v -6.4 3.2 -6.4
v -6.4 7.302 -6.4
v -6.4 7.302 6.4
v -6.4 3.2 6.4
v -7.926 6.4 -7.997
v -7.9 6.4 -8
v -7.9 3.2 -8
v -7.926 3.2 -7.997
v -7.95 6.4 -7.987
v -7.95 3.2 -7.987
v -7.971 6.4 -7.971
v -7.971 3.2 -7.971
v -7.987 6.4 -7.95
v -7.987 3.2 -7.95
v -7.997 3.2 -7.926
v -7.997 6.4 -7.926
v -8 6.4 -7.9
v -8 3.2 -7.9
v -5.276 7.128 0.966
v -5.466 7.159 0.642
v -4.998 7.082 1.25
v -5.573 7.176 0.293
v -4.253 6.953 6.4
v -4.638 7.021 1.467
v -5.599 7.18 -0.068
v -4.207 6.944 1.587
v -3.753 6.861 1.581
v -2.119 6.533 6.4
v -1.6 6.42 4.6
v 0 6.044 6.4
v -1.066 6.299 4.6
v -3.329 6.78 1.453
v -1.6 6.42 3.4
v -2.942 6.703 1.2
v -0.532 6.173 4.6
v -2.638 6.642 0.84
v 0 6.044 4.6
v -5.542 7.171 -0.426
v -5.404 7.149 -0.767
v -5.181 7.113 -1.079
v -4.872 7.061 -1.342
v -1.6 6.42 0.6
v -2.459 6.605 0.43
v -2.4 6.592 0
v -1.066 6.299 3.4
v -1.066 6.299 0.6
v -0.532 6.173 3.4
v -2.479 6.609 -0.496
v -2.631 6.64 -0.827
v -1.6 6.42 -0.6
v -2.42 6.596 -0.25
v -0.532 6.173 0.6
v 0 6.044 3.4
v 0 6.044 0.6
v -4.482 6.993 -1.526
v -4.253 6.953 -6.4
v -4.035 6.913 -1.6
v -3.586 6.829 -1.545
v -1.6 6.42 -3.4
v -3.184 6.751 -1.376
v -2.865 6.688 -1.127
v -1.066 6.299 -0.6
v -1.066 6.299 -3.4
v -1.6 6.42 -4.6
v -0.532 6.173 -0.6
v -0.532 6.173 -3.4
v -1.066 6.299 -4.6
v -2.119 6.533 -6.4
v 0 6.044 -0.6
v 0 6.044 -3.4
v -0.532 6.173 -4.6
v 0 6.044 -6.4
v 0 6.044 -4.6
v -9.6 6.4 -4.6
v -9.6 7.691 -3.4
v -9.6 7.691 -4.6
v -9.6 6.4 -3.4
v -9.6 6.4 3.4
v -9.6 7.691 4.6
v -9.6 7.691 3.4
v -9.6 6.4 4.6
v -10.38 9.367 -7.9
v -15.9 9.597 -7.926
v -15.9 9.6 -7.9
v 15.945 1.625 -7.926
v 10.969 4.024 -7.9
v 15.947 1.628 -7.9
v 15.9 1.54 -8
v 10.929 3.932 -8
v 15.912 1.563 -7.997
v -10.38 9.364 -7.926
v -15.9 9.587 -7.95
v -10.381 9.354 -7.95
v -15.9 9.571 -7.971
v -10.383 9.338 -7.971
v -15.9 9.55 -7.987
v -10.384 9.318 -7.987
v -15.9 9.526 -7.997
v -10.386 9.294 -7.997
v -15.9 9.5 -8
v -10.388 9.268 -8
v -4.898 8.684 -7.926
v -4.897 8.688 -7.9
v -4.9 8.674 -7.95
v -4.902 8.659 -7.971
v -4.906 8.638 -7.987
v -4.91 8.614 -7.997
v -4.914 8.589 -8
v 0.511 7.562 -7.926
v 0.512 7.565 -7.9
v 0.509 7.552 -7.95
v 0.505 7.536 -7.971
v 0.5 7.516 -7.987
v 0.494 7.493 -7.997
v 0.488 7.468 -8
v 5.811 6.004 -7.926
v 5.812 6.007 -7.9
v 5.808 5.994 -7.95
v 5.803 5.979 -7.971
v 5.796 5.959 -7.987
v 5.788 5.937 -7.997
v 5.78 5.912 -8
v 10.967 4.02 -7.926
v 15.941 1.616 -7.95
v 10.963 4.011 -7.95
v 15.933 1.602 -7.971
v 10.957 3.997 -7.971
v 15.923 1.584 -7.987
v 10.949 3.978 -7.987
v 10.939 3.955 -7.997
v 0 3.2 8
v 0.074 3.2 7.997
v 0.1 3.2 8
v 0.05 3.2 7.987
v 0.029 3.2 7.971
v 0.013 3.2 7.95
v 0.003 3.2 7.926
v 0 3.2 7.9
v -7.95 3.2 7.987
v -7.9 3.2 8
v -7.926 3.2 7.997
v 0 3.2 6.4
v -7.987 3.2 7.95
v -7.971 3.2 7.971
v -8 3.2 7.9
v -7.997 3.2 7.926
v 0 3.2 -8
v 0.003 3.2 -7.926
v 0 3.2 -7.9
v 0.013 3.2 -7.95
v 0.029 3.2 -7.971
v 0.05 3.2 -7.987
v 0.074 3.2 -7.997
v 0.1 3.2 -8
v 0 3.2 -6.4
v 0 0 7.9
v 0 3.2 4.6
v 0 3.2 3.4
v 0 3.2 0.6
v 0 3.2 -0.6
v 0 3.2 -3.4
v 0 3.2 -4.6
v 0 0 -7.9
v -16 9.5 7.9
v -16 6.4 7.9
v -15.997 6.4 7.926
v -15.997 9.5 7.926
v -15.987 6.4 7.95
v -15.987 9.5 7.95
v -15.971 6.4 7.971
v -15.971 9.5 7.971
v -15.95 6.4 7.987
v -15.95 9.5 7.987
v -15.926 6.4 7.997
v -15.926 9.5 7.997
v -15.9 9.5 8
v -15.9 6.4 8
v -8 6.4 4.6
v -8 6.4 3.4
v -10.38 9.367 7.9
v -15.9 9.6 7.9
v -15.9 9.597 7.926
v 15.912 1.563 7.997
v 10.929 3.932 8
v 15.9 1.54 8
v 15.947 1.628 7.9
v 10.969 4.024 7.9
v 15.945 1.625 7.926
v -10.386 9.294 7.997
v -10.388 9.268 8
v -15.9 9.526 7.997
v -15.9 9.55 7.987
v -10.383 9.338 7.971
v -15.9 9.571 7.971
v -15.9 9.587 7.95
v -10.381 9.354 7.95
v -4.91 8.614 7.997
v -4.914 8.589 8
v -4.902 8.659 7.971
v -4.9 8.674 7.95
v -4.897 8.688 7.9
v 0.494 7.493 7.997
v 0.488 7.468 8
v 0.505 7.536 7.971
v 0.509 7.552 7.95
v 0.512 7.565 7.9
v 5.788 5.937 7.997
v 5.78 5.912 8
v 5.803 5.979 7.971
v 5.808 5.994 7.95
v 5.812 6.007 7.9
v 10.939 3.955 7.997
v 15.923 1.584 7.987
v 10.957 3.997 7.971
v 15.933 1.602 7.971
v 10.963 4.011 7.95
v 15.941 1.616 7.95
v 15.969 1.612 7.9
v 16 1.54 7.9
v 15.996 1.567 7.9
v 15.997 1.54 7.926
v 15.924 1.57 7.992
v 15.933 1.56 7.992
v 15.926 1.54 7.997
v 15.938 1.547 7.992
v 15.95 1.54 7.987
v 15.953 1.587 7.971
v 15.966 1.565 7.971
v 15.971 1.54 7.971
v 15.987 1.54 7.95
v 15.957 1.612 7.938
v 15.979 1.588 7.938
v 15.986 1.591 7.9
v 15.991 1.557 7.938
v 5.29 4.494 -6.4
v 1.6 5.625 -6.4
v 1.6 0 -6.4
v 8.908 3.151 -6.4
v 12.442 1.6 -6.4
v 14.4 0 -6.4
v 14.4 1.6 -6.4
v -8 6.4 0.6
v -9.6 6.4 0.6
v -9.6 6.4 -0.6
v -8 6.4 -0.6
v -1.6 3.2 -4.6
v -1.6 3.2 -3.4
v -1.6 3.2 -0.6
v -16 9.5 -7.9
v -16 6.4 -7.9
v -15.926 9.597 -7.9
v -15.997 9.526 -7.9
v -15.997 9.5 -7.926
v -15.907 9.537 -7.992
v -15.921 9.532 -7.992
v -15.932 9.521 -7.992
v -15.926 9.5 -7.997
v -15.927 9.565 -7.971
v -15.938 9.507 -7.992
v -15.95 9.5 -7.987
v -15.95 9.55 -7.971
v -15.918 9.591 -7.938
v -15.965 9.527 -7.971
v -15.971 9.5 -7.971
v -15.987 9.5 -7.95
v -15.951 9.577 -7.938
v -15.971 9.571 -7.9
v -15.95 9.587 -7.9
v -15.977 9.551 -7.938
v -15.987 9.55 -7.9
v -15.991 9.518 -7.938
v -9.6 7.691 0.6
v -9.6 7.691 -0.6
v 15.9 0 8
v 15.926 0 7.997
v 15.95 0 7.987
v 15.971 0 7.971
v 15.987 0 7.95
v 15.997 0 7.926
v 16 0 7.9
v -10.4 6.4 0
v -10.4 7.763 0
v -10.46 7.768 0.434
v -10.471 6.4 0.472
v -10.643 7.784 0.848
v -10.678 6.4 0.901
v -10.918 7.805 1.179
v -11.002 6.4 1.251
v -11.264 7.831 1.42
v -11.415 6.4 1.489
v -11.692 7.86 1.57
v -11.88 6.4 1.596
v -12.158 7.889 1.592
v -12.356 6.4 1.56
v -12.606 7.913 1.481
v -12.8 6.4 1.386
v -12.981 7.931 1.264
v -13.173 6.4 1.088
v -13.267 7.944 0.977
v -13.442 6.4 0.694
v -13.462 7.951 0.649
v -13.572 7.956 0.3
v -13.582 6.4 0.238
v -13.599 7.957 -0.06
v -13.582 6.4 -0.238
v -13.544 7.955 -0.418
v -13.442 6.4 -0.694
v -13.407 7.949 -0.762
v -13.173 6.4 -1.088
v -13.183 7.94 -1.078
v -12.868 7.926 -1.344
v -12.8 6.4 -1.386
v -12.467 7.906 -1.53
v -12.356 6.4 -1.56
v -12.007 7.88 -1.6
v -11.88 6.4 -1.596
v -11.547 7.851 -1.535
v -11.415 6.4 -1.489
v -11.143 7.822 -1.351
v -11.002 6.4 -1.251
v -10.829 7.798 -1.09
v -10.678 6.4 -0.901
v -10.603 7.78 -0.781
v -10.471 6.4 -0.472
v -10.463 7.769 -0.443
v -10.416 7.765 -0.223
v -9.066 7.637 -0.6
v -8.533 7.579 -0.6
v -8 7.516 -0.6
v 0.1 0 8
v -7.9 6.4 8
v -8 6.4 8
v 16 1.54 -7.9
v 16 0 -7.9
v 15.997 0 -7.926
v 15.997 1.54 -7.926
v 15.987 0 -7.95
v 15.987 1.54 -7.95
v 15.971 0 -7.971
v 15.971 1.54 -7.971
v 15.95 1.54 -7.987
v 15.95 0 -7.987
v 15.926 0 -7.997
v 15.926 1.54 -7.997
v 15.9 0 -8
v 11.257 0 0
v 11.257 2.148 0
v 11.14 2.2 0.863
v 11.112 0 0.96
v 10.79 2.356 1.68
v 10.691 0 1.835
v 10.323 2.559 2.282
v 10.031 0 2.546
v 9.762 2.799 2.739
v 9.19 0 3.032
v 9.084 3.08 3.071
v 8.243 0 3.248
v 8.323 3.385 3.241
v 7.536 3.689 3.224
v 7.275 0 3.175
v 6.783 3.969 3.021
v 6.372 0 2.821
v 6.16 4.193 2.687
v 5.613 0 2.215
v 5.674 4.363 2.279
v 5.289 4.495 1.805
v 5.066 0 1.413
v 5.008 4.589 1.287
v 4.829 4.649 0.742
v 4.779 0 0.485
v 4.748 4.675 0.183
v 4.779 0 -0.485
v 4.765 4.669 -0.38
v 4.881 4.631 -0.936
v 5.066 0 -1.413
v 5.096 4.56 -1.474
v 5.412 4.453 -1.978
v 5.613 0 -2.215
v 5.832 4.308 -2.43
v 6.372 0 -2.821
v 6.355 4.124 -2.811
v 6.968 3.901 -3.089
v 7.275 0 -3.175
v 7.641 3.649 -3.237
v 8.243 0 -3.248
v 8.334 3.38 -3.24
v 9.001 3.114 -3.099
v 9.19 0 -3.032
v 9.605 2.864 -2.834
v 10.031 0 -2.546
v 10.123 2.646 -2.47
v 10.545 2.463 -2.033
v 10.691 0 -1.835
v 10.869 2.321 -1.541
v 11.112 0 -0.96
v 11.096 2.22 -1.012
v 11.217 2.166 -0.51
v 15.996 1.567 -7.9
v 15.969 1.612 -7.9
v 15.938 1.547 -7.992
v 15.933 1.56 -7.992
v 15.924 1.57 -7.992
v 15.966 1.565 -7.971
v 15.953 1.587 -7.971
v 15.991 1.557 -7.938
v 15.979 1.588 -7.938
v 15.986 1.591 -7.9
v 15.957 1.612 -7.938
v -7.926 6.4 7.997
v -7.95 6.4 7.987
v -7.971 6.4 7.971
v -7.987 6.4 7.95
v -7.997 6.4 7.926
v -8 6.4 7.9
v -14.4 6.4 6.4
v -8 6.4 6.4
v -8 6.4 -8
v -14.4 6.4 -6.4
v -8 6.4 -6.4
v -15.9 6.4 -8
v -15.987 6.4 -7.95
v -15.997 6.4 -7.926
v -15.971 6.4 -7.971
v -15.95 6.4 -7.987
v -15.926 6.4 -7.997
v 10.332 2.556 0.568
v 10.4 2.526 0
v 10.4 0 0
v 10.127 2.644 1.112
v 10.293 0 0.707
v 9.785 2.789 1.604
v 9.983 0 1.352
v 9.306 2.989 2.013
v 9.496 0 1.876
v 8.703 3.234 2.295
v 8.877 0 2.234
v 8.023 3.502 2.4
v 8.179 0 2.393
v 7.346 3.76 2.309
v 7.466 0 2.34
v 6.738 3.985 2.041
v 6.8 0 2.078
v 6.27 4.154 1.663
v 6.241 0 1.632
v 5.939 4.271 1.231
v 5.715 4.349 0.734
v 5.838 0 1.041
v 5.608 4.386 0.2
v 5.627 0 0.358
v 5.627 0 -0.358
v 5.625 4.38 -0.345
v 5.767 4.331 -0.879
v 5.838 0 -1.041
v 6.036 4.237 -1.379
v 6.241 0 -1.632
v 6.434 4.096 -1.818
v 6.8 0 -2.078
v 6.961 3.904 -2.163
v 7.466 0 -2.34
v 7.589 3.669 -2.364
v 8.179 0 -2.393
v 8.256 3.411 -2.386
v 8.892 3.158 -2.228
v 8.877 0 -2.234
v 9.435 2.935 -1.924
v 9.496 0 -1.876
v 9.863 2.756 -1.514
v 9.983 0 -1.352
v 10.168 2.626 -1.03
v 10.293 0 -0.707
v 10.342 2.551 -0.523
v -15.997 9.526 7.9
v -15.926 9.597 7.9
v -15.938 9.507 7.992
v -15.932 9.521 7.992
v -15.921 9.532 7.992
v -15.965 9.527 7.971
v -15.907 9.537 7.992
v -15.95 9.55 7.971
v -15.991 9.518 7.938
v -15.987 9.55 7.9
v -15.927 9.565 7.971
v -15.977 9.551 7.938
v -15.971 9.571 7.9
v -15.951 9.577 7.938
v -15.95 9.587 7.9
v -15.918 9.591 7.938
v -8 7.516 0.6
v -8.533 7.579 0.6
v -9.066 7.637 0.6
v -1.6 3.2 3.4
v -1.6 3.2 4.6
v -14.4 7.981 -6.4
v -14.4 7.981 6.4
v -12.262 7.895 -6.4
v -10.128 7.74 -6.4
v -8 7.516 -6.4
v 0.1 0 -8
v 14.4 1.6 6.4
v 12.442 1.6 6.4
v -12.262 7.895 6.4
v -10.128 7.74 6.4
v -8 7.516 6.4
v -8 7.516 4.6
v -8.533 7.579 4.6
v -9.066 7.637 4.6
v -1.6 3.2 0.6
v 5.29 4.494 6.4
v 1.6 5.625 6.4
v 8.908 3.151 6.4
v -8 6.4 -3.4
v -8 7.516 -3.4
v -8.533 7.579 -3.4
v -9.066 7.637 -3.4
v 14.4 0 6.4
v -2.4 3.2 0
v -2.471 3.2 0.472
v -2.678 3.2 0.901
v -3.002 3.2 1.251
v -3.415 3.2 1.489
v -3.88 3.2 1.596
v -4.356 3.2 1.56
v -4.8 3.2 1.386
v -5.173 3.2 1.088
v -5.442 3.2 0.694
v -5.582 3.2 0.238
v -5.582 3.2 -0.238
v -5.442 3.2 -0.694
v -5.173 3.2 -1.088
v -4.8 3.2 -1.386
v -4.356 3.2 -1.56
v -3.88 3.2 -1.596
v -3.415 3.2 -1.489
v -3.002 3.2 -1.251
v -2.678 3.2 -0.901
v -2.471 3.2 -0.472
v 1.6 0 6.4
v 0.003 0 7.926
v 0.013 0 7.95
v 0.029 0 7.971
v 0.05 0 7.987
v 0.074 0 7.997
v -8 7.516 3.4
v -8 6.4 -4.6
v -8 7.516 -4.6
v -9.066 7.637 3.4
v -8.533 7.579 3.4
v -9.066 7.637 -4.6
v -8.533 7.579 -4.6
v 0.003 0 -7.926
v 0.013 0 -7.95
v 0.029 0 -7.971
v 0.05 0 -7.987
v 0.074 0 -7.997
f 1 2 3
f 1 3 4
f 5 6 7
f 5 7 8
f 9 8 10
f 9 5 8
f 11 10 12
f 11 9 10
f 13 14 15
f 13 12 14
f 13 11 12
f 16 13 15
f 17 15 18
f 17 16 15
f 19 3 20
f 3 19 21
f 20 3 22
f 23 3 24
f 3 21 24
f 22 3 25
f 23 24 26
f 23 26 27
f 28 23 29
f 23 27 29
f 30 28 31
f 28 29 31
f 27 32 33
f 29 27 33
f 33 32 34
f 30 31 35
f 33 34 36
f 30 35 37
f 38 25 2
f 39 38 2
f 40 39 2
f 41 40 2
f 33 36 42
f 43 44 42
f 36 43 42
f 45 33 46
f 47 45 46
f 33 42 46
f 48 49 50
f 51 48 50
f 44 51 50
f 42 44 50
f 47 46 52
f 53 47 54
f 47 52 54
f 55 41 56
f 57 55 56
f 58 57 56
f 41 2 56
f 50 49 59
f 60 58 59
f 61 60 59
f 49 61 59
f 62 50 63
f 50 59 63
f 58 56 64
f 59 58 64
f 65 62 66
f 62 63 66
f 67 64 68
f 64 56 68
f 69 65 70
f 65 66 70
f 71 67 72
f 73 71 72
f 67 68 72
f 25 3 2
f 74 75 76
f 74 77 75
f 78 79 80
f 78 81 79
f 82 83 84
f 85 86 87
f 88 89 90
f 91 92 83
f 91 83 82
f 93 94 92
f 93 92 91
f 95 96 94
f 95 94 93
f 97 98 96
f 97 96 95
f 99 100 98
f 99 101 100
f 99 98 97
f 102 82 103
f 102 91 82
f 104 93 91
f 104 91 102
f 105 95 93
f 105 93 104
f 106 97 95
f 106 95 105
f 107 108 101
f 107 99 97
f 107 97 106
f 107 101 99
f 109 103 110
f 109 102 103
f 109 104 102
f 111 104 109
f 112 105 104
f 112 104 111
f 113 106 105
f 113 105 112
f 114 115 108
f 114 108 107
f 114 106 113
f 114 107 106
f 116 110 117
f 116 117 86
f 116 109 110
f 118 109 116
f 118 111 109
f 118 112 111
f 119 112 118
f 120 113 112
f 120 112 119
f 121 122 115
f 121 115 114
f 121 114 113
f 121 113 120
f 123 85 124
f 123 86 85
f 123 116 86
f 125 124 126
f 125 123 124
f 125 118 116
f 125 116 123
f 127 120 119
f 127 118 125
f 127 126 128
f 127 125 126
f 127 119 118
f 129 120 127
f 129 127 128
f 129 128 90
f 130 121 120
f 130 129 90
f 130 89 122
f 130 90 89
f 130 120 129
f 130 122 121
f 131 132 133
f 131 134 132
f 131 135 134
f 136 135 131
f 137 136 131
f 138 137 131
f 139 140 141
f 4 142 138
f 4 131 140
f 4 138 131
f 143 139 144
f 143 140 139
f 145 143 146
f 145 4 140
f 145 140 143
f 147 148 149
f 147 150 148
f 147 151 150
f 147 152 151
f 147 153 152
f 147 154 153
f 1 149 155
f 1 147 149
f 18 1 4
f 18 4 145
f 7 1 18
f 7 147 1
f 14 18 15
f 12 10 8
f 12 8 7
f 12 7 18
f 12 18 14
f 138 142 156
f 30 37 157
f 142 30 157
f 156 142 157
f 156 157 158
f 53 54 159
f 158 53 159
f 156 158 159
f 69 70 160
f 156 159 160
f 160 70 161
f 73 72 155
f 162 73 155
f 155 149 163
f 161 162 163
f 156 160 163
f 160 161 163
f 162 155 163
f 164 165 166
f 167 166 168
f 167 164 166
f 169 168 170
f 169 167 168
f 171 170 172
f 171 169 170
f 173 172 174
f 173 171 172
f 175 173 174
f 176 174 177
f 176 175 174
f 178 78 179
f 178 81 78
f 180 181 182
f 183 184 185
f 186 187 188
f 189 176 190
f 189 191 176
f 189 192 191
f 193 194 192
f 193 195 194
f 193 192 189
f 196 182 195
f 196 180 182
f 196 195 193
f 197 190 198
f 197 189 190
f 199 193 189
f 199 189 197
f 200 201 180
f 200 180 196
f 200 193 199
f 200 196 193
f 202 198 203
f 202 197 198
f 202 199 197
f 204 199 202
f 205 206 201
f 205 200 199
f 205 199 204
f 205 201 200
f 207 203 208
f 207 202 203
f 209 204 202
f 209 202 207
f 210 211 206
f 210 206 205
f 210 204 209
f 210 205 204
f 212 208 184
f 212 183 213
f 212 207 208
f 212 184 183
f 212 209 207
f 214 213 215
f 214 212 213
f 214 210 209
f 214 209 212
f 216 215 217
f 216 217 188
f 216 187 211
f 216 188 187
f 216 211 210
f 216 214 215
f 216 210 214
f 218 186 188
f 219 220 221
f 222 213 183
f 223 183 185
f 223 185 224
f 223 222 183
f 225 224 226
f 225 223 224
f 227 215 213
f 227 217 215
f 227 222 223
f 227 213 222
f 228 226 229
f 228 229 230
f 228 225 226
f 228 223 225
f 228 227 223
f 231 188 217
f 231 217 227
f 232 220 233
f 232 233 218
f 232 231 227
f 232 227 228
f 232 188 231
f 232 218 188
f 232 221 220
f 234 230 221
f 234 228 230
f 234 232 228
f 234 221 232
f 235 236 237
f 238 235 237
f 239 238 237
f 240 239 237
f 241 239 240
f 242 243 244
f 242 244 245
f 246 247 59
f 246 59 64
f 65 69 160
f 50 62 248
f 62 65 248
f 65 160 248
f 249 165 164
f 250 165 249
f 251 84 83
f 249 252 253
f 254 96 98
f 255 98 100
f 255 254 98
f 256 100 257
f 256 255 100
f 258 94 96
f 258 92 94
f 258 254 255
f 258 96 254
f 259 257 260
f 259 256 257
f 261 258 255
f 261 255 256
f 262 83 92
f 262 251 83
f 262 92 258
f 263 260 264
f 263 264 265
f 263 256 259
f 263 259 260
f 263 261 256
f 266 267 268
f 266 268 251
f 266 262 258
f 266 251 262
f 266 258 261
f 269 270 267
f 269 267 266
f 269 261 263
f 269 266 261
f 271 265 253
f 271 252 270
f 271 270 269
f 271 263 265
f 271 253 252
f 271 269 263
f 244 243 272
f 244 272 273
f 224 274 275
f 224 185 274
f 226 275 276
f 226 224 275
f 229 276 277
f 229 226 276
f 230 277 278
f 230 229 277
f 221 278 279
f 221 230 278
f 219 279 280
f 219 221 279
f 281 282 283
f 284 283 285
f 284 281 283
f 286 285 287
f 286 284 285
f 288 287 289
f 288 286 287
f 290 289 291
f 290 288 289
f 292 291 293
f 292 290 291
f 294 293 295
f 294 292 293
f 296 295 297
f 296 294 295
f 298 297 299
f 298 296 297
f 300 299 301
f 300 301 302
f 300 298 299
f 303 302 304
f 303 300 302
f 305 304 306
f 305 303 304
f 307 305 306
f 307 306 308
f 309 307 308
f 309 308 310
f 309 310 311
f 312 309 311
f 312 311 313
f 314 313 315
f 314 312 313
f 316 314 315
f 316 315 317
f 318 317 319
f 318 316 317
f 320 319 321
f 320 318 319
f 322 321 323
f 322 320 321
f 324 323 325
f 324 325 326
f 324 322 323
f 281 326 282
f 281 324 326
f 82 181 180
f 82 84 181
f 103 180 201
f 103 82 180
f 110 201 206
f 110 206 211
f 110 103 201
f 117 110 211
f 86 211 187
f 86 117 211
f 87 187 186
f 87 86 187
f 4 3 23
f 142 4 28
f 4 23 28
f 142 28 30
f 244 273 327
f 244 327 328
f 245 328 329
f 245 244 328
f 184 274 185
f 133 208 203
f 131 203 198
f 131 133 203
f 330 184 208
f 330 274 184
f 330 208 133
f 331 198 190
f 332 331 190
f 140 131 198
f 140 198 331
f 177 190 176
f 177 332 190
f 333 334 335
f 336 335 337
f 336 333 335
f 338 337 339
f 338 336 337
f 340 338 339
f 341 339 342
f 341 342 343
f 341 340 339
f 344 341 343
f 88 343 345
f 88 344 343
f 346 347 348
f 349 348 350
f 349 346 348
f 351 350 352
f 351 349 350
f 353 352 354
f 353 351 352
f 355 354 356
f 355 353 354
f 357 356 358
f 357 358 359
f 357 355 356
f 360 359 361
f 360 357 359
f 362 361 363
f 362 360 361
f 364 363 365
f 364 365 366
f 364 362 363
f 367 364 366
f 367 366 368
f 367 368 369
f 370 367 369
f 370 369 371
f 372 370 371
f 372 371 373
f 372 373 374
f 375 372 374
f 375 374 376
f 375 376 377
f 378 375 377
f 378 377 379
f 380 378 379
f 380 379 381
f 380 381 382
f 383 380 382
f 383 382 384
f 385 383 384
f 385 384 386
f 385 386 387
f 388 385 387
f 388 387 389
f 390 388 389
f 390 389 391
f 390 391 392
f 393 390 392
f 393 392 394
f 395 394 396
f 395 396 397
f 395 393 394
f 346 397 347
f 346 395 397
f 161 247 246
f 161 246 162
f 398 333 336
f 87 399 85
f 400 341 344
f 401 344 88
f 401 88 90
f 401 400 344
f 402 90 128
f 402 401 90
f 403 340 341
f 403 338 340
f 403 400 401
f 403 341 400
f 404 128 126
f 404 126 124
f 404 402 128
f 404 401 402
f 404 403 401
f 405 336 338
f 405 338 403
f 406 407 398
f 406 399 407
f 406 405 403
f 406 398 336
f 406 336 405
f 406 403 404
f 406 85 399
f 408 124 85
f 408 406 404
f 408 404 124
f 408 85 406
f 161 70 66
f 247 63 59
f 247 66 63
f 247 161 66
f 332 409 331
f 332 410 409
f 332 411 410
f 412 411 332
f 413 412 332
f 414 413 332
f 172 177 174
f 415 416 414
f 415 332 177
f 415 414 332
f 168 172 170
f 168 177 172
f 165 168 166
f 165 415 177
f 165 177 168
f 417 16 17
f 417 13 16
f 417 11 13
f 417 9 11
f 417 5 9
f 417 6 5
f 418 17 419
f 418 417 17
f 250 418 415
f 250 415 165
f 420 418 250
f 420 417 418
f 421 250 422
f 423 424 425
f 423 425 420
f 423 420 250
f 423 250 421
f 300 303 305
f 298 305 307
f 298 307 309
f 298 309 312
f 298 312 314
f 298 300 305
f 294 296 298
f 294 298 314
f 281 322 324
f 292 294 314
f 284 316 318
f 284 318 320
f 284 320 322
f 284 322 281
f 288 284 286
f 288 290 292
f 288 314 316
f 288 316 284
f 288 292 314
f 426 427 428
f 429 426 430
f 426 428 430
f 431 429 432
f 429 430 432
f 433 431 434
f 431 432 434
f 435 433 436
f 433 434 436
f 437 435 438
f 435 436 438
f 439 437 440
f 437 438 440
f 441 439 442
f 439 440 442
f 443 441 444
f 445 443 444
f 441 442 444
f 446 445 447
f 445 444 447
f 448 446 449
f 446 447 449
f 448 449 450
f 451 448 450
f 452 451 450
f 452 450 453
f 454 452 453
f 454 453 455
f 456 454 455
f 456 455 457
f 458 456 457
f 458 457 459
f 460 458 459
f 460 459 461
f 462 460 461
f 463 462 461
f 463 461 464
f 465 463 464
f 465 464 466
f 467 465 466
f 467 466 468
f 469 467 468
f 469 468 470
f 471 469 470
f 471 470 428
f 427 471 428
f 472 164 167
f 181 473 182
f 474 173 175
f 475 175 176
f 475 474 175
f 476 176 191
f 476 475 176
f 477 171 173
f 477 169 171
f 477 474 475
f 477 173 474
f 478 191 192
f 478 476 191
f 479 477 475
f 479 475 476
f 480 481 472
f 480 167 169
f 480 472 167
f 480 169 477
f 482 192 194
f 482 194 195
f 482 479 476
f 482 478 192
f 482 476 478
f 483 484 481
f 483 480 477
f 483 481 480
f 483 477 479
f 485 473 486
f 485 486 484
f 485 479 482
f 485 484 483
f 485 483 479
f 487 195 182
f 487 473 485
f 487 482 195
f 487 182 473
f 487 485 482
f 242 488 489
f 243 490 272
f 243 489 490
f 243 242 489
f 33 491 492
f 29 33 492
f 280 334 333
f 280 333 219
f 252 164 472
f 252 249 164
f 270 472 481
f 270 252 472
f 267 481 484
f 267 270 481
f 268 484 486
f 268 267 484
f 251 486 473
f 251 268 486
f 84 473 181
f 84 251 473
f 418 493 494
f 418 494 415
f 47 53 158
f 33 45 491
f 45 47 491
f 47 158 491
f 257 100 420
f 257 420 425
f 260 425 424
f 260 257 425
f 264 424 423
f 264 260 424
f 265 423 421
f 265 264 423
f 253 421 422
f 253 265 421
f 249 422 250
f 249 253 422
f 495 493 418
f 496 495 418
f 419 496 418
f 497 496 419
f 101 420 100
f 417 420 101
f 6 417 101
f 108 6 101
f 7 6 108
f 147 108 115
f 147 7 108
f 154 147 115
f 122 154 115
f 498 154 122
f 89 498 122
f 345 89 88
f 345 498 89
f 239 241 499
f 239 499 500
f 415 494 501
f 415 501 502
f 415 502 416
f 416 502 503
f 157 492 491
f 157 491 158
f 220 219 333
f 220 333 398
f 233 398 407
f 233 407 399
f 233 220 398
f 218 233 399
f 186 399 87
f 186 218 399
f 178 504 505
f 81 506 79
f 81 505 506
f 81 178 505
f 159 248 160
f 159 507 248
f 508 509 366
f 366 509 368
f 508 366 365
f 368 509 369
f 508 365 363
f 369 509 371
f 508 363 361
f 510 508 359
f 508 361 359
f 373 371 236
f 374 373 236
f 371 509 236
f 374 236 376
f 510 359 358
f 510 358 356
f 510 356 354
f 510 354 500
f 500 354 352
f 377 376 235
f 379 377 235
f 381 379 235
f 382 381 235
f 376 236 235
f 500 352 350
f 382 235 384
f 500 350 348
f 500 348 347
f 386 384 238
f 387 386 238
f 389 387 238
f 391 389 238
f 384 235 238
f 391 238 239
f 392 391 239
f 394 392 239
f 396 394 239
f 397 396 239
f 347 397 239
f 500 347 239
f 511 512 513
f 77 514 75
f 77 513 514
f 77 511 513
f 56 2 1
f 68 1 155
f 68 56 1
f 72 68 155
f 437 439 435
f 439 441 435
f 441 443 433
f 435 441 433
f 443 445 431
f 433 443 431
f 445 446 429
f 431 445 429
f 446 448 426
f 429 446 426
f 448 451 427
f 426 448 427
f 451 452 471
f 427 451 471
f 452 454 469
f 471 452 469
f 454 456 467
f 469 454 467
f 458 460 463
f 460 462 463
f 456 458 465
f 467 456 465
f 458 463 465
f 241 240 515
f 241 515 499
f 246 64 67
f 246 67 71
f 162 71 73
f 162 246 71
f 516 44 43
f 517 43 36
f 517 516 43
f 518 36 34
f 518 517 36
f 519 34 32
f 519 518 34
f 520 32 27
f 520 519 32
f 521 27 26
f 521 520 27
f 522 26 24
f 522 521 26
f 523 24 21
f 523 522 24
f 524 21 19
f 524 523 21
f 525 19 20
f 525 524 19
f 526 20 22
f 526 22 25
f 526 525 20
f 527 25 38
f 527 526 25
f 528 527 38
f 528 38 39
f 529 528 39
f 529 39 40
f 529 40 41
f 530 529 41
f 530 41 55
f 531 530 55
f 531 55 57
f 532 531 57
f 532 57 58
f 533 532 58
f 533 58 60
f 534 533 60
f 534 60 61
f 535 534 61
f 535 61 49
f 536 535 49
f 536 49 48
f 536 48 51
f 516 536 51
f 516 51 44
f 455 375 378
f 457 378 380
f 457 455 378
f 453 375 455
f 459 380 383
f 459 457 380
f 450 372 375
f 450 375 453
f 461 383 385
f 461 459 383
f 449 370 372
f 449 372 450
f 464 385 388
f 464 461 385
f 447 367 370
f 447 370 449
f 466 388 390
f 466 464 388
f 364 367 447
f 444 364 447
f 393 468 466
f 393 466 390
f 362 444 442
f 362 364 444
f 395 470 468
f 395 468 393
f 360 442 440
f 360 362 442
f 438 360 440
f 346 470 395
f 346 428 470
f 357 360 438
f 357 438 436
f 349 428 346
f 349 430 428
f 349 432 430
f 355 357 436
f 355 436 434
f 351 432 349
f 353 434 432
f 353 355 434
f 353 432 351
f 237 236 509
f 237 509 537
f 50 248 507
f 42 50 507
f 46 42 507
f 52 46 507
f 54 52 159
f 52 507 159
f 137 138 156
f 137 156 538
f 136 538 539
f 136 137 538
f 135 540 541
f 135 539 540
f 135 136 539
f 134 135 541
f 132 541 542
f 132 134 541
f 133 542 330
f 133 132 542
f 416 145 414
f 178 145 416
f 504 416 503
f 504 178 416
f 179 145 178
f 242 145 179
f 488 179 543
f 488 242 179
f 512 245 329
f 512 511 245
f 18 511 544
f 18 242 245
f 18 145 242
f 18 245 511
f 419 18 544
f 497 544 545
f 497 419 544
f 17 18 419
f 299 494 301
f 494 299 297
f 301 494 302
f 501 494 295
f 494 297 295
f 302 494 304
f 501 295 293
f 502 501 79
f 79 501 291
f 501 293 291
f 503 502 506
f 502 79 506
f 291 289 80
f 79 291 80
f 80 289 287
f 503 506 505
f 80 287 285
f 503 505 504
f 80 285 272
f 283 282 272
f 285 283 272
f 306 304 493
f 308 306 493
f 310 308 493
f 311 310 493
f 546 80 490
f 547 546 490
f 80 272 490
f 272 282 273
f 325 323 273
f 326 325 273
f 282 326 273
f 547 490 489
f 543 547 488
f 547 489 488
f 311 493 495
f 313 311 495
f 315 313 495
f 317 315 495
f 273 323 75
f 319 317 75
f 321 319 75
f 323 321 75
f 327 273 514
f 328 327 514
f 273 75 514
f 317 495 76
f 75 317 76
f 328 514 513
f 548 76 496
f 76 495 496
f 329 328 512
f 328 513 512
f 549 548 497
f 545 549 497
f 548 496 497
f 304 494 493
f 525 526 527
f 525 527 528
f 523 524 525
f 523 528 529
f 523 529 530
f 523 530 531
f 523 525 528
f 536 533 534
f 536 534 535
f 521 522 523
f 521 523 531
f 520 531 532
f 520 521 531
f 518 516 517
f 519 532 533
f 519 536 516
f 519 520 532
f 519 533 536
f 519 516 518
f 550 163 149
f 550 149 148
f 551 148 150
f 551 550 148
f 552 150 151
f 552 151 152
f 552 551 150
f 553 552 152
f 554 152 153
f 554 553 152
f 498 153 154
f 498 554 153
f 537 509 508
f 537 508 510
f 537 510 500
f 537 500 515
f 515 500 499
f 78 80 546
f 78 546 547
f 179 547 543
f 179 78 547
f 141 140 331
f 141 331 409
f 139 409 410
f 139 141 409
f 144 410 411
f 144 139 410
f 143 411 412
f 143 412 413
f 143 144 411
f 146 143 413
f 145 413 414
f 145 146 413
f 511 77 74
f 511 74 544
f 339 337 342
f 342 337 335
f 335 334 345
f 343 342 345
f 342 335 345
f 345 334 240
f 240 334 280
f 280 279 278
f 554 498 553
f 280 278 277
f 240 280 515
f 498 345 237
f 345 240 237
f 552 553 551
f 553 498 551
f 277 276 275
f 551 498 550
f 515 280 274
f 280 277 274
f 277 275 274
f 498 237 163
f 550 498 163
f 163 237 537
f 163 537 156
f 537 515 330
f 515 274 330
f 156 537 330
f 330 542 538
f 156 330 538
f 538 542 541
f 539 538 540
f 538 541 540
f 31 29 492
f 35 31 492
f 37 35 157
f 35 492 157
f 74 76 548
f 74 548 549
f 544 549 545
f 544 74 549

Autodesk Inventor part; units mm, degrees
ref_plane "YZ Plane" through (0, 0, 0) normal (1, 0, 0) x (0, 1, 0)
ref_plane "XZ Plane" through (0, 0, 0) normal (0, 1, 0) x (-1, 0, 0)
ref_plane "XY Plane" through (0, 0, 0) normal (0, 0, 1) x (1, 0, 0)
sketch "Sketch2" plane through (0, 0, 0) normal (0, 1, 0) x (-1, 0, 0)
  line L0 (-16, 8) -> (16, 8)
  line L1 (16, 8) -> (16, -8)
  line L2 (16, -8) -> (-16, -8)
  line L3 (-16, -8) -> (-16, 8)
  point P0 (0, 0)
  point P1 (0, 8)
  point P2 (-16, 0)
  dimension "d0" = 32
  dimension "d1" = 16
extrude "Extrusion1" add sketch "Sketch2" along normal blind 9.6
sketch "Sketch10" plane through (0, 0, 0) normal (0, 0, 1) x (1, 0, 0)
  line L0 (-16, 9.6) -> (16, 9.6) projected
  line L1 (-16, 0) -> (-16, 9.6) projected
  arc A0 (16, 1.6) -> (-16, 9.6) centre (-16, -58.4) ccw
  line L2 (16, 1.6) -> (16, 9.6)
  line L3 (-16, 0) -> (16, 0) projected
  line L4 (14.4, 0) -> (14.4, 1.6)
  line L5 (14.4, 1.6) -> (12.4422, 1.6)
  line L6 (-8, 3.2) -> (-8, 7.5163)
  line L7 (-6.4, 7.3024) -> (-6.4, 3.2)
  arc A1 (12.4422, 1.6) -> (-6.4, 7.3024) centre (-16, -58.4) ccw
  arc A2 (-8, 7.5163) -> (-14.4, 7.9807) centre (-16, -58.4) ccw
  line L8 (-14.4, 7.9807) -> (-14.4, 6.4)
  line L9 (1.6, 5.625) -> (1.6, 0)
  line L10 (0, 6.0435) -> (0, 0)
  line L11 (0, 3.2) -> (-6.4, 3.2)
  line L12 (-8, 6.4) -> (-14.4, 6.4)
  line L13 (-14.4, 6.4) -> (-16, 6.4)
  line L14 (16, 0) -> (16, 9.6) projected
  line L15 (1.6, 0) -> (14.4, 0)
  line L16 (0, 0) -> (-16, 0)
  line L17 (-16, 0) -> (-16, 6.4)
  line L18 (-6.4, 3.2) -> (-8, 3.2)
  dimension "d100" = 1.6
  dimension "d104" = 1.6
  dimension "d105" = 1.6
  dimension "d107" = 1.6
  dimension "d108" = 1.6
  dimension "d113" = 6.4
  dimension "d114" = 3.2
  dimension "d115" = 16
  dimension "d116" = 1.6
extrude "Extrusion7" cut sketch "Sketch10" along normal through all both and the other way through all contours L0 L2 A0 | L13 L12 L6 L18 L11 L10 L3 L1
extrude "Extrusion8" cut sketch "Sketch10" along normal mid plane 12.8 contours L8 A2 L6 L12 | L3 L9 A1 L5 L4 | L11 L7 A1 L10
sketch "Sketch3" plane through (0, 0, 0) normal (0, -1, 0) x (1, 0, 0)
  circle A0 centre (12, 4) radius 2.4 construction
  line L0 (14.4, -6.4) -> (1.6, -6.4) projected
  line L1 (1.6, -6.4) -> (1.6, 6.4) projected
  line L2 (1.6, 6.4) -> (14.4, 6.4) projected
  line L3 (14.4, 6.4) -> (14.4, -6.4) projected
  circle A1 centre (8, 0) radius 3.2569
  circle A2 centre (8, 0) radius 2.4
  circle A3 centre (12, -4) radius 2.4 construction
  point P0 (8, 6.4)
  point P1 (1.6, 0)
  dimension "d97" = 4.8
extrude "Extrusion2" add sketch "Sketch3" against normal up to next contours A1
sketch "Sketch11" plane through (-8, 3.2, 8) normal (0, -1, 0) x (1, 0, 0)
  line L0 (8, -1.6) -> (8, 0) projected
  line L1 (8, -14.4) -> (1.6, -14.4) projected
  line L2 (1.6, -14.4) -> (1.6, -1.6) projected
  circle A0 centre (4, -12) radius 2.4 construction
  line L3 (8, -11.4) -> (6.4, -11.4)
  line L4 (6.4, -11.4) -> (6.4, -12.6)
  line L5 (6.4, -12.6) -> (8, -12.6)
  line L6 (8, -11.4) -> (8, -12.6)
  line L7 (1.6, -1.6) -> (8, -1.6) projected
  circle A1 centre (4, -4) radius 2.4 construction
  line L8 (8, -4.6) -> (6.4, -4.6)
  line L9 (6.4, -4.6) -> (6.4, -3.4)
  line L10 (6.4, -3.4) -> (8, -3.4)
  line L11 (8, -3.4) -> (8, -4.6)
  circle A2 centre (4, -8) radius 1.6
  line L12 (6.4, -7.4) -> (8, -7.4)
  line L13 (8, -7.4) -> (8, -8.6)
  line L14 (8, -8.6) -> (6.4, -8.6)
  line L15 (6.4, -8.6) -> (6.4, -7.4)
  point P0 (8, -8)
  point P1 (6.4, -12)
  point P2 (6.4, -4)
  point P3 (6.4, -8)
  dimension "d119" = 1.2
  dimension "d129" = 4.8
extrude "Extrusion9" add sketch "Sketch11" against normal up to next
sketch "Sketch12" plane through (-16, 6.4, 8) normal (0, -1, 0) x (1, 0, 0)
  line L0 (1.6, -1.6) -> (8, -1.6) projected
  line L1 (8, -14.4) -> (1.6, -14.4) projected
  line L2 (1.6, -14.4) -> (1.6, -1.6) projected
  line L3 (8, -3.4) -> (6.4, -3.4)
  line L4 (6.4, -3.4) -> (6.4, -4.6)
  line L5 (6.4, -4.6) -> (8, -4.6)
  line L6 (8, -4.6) -> (8, -3.4)
  circle A0 centre (4, -4) radius 2.4 construction
  circle A1 centre (4, -12) radius 2.4 construction
  line L7 (8, -11.4) -> (6.4, -11.4)
  line L8 (6.4, -11.4) -> (6.4, -12.6)
  line L9 (6.4, -12.6) -> (8, -12.6)
  line L10 (8, -12.6) -> (8, -11.4)
  line L11 (8, -7.4) -> (6.4, -7.4)
  line L12 (6.4, -7.4) -> (6.4, -8.6)
  line L13 (6.4, -8.6) -> (8, -8.6)
  line L14 (8, -8.6) -> (8, -7.4)
  circle A2 centre (4, -8) radius 1.6
  point P0 (16, -8)
  point P1 (6.4, -4)
  point P2 (6.4, -12)
  point P3 (6.4, -8)
  dimension "d122" = 1.2
  dimension "d130" = 4.8
extrude "Extrusion10" add sketch "Sketch12" against normal up to next
fillet "Fillet1" radius 0.1 12 edges at (-16, 8, 8) (-16, 9.6, 0) (16, 0.8, 8) (16, 0.8, -8) (-16, 8, -8) (0.4924, 7.5697, 8) (0.4924, 7.5697, -8) (16, 1.6, 0) (-8, 4.8, 8) (0, 1.6, 8) (0, 1.6, -8) (-8, 4.8, -8)
equation "\"d4\" = lh"
equation "\"d100\" = wall"
equation "\"d104\" = wall"
equation "\"d105\" = 0.333333 * lh - topthk"
equation "\"d107\" = topthk"
equation "\"d108\" = d104"
equation "\"d113\" = 0.666667 * lh"
equation "\"d114\" = 0.333333 * lh"
equation "\"d115\" = 2 * lu"
equation "\"d116\" = wall"
equation "\"d109\" = 2 * lu - 2 * wall"
equation "\"d97\" = kd"
equation "\"d129\" = kd"
equation "\"lh\" = 9.6"
equation "\"wall\" = 1.6"
equation "\"topthk\" = 1.6"
equation "\"lu\" = 8"
equation "\"kd\" = 4.8"
properties part number "93606-Black" material "ABS Plastic"
